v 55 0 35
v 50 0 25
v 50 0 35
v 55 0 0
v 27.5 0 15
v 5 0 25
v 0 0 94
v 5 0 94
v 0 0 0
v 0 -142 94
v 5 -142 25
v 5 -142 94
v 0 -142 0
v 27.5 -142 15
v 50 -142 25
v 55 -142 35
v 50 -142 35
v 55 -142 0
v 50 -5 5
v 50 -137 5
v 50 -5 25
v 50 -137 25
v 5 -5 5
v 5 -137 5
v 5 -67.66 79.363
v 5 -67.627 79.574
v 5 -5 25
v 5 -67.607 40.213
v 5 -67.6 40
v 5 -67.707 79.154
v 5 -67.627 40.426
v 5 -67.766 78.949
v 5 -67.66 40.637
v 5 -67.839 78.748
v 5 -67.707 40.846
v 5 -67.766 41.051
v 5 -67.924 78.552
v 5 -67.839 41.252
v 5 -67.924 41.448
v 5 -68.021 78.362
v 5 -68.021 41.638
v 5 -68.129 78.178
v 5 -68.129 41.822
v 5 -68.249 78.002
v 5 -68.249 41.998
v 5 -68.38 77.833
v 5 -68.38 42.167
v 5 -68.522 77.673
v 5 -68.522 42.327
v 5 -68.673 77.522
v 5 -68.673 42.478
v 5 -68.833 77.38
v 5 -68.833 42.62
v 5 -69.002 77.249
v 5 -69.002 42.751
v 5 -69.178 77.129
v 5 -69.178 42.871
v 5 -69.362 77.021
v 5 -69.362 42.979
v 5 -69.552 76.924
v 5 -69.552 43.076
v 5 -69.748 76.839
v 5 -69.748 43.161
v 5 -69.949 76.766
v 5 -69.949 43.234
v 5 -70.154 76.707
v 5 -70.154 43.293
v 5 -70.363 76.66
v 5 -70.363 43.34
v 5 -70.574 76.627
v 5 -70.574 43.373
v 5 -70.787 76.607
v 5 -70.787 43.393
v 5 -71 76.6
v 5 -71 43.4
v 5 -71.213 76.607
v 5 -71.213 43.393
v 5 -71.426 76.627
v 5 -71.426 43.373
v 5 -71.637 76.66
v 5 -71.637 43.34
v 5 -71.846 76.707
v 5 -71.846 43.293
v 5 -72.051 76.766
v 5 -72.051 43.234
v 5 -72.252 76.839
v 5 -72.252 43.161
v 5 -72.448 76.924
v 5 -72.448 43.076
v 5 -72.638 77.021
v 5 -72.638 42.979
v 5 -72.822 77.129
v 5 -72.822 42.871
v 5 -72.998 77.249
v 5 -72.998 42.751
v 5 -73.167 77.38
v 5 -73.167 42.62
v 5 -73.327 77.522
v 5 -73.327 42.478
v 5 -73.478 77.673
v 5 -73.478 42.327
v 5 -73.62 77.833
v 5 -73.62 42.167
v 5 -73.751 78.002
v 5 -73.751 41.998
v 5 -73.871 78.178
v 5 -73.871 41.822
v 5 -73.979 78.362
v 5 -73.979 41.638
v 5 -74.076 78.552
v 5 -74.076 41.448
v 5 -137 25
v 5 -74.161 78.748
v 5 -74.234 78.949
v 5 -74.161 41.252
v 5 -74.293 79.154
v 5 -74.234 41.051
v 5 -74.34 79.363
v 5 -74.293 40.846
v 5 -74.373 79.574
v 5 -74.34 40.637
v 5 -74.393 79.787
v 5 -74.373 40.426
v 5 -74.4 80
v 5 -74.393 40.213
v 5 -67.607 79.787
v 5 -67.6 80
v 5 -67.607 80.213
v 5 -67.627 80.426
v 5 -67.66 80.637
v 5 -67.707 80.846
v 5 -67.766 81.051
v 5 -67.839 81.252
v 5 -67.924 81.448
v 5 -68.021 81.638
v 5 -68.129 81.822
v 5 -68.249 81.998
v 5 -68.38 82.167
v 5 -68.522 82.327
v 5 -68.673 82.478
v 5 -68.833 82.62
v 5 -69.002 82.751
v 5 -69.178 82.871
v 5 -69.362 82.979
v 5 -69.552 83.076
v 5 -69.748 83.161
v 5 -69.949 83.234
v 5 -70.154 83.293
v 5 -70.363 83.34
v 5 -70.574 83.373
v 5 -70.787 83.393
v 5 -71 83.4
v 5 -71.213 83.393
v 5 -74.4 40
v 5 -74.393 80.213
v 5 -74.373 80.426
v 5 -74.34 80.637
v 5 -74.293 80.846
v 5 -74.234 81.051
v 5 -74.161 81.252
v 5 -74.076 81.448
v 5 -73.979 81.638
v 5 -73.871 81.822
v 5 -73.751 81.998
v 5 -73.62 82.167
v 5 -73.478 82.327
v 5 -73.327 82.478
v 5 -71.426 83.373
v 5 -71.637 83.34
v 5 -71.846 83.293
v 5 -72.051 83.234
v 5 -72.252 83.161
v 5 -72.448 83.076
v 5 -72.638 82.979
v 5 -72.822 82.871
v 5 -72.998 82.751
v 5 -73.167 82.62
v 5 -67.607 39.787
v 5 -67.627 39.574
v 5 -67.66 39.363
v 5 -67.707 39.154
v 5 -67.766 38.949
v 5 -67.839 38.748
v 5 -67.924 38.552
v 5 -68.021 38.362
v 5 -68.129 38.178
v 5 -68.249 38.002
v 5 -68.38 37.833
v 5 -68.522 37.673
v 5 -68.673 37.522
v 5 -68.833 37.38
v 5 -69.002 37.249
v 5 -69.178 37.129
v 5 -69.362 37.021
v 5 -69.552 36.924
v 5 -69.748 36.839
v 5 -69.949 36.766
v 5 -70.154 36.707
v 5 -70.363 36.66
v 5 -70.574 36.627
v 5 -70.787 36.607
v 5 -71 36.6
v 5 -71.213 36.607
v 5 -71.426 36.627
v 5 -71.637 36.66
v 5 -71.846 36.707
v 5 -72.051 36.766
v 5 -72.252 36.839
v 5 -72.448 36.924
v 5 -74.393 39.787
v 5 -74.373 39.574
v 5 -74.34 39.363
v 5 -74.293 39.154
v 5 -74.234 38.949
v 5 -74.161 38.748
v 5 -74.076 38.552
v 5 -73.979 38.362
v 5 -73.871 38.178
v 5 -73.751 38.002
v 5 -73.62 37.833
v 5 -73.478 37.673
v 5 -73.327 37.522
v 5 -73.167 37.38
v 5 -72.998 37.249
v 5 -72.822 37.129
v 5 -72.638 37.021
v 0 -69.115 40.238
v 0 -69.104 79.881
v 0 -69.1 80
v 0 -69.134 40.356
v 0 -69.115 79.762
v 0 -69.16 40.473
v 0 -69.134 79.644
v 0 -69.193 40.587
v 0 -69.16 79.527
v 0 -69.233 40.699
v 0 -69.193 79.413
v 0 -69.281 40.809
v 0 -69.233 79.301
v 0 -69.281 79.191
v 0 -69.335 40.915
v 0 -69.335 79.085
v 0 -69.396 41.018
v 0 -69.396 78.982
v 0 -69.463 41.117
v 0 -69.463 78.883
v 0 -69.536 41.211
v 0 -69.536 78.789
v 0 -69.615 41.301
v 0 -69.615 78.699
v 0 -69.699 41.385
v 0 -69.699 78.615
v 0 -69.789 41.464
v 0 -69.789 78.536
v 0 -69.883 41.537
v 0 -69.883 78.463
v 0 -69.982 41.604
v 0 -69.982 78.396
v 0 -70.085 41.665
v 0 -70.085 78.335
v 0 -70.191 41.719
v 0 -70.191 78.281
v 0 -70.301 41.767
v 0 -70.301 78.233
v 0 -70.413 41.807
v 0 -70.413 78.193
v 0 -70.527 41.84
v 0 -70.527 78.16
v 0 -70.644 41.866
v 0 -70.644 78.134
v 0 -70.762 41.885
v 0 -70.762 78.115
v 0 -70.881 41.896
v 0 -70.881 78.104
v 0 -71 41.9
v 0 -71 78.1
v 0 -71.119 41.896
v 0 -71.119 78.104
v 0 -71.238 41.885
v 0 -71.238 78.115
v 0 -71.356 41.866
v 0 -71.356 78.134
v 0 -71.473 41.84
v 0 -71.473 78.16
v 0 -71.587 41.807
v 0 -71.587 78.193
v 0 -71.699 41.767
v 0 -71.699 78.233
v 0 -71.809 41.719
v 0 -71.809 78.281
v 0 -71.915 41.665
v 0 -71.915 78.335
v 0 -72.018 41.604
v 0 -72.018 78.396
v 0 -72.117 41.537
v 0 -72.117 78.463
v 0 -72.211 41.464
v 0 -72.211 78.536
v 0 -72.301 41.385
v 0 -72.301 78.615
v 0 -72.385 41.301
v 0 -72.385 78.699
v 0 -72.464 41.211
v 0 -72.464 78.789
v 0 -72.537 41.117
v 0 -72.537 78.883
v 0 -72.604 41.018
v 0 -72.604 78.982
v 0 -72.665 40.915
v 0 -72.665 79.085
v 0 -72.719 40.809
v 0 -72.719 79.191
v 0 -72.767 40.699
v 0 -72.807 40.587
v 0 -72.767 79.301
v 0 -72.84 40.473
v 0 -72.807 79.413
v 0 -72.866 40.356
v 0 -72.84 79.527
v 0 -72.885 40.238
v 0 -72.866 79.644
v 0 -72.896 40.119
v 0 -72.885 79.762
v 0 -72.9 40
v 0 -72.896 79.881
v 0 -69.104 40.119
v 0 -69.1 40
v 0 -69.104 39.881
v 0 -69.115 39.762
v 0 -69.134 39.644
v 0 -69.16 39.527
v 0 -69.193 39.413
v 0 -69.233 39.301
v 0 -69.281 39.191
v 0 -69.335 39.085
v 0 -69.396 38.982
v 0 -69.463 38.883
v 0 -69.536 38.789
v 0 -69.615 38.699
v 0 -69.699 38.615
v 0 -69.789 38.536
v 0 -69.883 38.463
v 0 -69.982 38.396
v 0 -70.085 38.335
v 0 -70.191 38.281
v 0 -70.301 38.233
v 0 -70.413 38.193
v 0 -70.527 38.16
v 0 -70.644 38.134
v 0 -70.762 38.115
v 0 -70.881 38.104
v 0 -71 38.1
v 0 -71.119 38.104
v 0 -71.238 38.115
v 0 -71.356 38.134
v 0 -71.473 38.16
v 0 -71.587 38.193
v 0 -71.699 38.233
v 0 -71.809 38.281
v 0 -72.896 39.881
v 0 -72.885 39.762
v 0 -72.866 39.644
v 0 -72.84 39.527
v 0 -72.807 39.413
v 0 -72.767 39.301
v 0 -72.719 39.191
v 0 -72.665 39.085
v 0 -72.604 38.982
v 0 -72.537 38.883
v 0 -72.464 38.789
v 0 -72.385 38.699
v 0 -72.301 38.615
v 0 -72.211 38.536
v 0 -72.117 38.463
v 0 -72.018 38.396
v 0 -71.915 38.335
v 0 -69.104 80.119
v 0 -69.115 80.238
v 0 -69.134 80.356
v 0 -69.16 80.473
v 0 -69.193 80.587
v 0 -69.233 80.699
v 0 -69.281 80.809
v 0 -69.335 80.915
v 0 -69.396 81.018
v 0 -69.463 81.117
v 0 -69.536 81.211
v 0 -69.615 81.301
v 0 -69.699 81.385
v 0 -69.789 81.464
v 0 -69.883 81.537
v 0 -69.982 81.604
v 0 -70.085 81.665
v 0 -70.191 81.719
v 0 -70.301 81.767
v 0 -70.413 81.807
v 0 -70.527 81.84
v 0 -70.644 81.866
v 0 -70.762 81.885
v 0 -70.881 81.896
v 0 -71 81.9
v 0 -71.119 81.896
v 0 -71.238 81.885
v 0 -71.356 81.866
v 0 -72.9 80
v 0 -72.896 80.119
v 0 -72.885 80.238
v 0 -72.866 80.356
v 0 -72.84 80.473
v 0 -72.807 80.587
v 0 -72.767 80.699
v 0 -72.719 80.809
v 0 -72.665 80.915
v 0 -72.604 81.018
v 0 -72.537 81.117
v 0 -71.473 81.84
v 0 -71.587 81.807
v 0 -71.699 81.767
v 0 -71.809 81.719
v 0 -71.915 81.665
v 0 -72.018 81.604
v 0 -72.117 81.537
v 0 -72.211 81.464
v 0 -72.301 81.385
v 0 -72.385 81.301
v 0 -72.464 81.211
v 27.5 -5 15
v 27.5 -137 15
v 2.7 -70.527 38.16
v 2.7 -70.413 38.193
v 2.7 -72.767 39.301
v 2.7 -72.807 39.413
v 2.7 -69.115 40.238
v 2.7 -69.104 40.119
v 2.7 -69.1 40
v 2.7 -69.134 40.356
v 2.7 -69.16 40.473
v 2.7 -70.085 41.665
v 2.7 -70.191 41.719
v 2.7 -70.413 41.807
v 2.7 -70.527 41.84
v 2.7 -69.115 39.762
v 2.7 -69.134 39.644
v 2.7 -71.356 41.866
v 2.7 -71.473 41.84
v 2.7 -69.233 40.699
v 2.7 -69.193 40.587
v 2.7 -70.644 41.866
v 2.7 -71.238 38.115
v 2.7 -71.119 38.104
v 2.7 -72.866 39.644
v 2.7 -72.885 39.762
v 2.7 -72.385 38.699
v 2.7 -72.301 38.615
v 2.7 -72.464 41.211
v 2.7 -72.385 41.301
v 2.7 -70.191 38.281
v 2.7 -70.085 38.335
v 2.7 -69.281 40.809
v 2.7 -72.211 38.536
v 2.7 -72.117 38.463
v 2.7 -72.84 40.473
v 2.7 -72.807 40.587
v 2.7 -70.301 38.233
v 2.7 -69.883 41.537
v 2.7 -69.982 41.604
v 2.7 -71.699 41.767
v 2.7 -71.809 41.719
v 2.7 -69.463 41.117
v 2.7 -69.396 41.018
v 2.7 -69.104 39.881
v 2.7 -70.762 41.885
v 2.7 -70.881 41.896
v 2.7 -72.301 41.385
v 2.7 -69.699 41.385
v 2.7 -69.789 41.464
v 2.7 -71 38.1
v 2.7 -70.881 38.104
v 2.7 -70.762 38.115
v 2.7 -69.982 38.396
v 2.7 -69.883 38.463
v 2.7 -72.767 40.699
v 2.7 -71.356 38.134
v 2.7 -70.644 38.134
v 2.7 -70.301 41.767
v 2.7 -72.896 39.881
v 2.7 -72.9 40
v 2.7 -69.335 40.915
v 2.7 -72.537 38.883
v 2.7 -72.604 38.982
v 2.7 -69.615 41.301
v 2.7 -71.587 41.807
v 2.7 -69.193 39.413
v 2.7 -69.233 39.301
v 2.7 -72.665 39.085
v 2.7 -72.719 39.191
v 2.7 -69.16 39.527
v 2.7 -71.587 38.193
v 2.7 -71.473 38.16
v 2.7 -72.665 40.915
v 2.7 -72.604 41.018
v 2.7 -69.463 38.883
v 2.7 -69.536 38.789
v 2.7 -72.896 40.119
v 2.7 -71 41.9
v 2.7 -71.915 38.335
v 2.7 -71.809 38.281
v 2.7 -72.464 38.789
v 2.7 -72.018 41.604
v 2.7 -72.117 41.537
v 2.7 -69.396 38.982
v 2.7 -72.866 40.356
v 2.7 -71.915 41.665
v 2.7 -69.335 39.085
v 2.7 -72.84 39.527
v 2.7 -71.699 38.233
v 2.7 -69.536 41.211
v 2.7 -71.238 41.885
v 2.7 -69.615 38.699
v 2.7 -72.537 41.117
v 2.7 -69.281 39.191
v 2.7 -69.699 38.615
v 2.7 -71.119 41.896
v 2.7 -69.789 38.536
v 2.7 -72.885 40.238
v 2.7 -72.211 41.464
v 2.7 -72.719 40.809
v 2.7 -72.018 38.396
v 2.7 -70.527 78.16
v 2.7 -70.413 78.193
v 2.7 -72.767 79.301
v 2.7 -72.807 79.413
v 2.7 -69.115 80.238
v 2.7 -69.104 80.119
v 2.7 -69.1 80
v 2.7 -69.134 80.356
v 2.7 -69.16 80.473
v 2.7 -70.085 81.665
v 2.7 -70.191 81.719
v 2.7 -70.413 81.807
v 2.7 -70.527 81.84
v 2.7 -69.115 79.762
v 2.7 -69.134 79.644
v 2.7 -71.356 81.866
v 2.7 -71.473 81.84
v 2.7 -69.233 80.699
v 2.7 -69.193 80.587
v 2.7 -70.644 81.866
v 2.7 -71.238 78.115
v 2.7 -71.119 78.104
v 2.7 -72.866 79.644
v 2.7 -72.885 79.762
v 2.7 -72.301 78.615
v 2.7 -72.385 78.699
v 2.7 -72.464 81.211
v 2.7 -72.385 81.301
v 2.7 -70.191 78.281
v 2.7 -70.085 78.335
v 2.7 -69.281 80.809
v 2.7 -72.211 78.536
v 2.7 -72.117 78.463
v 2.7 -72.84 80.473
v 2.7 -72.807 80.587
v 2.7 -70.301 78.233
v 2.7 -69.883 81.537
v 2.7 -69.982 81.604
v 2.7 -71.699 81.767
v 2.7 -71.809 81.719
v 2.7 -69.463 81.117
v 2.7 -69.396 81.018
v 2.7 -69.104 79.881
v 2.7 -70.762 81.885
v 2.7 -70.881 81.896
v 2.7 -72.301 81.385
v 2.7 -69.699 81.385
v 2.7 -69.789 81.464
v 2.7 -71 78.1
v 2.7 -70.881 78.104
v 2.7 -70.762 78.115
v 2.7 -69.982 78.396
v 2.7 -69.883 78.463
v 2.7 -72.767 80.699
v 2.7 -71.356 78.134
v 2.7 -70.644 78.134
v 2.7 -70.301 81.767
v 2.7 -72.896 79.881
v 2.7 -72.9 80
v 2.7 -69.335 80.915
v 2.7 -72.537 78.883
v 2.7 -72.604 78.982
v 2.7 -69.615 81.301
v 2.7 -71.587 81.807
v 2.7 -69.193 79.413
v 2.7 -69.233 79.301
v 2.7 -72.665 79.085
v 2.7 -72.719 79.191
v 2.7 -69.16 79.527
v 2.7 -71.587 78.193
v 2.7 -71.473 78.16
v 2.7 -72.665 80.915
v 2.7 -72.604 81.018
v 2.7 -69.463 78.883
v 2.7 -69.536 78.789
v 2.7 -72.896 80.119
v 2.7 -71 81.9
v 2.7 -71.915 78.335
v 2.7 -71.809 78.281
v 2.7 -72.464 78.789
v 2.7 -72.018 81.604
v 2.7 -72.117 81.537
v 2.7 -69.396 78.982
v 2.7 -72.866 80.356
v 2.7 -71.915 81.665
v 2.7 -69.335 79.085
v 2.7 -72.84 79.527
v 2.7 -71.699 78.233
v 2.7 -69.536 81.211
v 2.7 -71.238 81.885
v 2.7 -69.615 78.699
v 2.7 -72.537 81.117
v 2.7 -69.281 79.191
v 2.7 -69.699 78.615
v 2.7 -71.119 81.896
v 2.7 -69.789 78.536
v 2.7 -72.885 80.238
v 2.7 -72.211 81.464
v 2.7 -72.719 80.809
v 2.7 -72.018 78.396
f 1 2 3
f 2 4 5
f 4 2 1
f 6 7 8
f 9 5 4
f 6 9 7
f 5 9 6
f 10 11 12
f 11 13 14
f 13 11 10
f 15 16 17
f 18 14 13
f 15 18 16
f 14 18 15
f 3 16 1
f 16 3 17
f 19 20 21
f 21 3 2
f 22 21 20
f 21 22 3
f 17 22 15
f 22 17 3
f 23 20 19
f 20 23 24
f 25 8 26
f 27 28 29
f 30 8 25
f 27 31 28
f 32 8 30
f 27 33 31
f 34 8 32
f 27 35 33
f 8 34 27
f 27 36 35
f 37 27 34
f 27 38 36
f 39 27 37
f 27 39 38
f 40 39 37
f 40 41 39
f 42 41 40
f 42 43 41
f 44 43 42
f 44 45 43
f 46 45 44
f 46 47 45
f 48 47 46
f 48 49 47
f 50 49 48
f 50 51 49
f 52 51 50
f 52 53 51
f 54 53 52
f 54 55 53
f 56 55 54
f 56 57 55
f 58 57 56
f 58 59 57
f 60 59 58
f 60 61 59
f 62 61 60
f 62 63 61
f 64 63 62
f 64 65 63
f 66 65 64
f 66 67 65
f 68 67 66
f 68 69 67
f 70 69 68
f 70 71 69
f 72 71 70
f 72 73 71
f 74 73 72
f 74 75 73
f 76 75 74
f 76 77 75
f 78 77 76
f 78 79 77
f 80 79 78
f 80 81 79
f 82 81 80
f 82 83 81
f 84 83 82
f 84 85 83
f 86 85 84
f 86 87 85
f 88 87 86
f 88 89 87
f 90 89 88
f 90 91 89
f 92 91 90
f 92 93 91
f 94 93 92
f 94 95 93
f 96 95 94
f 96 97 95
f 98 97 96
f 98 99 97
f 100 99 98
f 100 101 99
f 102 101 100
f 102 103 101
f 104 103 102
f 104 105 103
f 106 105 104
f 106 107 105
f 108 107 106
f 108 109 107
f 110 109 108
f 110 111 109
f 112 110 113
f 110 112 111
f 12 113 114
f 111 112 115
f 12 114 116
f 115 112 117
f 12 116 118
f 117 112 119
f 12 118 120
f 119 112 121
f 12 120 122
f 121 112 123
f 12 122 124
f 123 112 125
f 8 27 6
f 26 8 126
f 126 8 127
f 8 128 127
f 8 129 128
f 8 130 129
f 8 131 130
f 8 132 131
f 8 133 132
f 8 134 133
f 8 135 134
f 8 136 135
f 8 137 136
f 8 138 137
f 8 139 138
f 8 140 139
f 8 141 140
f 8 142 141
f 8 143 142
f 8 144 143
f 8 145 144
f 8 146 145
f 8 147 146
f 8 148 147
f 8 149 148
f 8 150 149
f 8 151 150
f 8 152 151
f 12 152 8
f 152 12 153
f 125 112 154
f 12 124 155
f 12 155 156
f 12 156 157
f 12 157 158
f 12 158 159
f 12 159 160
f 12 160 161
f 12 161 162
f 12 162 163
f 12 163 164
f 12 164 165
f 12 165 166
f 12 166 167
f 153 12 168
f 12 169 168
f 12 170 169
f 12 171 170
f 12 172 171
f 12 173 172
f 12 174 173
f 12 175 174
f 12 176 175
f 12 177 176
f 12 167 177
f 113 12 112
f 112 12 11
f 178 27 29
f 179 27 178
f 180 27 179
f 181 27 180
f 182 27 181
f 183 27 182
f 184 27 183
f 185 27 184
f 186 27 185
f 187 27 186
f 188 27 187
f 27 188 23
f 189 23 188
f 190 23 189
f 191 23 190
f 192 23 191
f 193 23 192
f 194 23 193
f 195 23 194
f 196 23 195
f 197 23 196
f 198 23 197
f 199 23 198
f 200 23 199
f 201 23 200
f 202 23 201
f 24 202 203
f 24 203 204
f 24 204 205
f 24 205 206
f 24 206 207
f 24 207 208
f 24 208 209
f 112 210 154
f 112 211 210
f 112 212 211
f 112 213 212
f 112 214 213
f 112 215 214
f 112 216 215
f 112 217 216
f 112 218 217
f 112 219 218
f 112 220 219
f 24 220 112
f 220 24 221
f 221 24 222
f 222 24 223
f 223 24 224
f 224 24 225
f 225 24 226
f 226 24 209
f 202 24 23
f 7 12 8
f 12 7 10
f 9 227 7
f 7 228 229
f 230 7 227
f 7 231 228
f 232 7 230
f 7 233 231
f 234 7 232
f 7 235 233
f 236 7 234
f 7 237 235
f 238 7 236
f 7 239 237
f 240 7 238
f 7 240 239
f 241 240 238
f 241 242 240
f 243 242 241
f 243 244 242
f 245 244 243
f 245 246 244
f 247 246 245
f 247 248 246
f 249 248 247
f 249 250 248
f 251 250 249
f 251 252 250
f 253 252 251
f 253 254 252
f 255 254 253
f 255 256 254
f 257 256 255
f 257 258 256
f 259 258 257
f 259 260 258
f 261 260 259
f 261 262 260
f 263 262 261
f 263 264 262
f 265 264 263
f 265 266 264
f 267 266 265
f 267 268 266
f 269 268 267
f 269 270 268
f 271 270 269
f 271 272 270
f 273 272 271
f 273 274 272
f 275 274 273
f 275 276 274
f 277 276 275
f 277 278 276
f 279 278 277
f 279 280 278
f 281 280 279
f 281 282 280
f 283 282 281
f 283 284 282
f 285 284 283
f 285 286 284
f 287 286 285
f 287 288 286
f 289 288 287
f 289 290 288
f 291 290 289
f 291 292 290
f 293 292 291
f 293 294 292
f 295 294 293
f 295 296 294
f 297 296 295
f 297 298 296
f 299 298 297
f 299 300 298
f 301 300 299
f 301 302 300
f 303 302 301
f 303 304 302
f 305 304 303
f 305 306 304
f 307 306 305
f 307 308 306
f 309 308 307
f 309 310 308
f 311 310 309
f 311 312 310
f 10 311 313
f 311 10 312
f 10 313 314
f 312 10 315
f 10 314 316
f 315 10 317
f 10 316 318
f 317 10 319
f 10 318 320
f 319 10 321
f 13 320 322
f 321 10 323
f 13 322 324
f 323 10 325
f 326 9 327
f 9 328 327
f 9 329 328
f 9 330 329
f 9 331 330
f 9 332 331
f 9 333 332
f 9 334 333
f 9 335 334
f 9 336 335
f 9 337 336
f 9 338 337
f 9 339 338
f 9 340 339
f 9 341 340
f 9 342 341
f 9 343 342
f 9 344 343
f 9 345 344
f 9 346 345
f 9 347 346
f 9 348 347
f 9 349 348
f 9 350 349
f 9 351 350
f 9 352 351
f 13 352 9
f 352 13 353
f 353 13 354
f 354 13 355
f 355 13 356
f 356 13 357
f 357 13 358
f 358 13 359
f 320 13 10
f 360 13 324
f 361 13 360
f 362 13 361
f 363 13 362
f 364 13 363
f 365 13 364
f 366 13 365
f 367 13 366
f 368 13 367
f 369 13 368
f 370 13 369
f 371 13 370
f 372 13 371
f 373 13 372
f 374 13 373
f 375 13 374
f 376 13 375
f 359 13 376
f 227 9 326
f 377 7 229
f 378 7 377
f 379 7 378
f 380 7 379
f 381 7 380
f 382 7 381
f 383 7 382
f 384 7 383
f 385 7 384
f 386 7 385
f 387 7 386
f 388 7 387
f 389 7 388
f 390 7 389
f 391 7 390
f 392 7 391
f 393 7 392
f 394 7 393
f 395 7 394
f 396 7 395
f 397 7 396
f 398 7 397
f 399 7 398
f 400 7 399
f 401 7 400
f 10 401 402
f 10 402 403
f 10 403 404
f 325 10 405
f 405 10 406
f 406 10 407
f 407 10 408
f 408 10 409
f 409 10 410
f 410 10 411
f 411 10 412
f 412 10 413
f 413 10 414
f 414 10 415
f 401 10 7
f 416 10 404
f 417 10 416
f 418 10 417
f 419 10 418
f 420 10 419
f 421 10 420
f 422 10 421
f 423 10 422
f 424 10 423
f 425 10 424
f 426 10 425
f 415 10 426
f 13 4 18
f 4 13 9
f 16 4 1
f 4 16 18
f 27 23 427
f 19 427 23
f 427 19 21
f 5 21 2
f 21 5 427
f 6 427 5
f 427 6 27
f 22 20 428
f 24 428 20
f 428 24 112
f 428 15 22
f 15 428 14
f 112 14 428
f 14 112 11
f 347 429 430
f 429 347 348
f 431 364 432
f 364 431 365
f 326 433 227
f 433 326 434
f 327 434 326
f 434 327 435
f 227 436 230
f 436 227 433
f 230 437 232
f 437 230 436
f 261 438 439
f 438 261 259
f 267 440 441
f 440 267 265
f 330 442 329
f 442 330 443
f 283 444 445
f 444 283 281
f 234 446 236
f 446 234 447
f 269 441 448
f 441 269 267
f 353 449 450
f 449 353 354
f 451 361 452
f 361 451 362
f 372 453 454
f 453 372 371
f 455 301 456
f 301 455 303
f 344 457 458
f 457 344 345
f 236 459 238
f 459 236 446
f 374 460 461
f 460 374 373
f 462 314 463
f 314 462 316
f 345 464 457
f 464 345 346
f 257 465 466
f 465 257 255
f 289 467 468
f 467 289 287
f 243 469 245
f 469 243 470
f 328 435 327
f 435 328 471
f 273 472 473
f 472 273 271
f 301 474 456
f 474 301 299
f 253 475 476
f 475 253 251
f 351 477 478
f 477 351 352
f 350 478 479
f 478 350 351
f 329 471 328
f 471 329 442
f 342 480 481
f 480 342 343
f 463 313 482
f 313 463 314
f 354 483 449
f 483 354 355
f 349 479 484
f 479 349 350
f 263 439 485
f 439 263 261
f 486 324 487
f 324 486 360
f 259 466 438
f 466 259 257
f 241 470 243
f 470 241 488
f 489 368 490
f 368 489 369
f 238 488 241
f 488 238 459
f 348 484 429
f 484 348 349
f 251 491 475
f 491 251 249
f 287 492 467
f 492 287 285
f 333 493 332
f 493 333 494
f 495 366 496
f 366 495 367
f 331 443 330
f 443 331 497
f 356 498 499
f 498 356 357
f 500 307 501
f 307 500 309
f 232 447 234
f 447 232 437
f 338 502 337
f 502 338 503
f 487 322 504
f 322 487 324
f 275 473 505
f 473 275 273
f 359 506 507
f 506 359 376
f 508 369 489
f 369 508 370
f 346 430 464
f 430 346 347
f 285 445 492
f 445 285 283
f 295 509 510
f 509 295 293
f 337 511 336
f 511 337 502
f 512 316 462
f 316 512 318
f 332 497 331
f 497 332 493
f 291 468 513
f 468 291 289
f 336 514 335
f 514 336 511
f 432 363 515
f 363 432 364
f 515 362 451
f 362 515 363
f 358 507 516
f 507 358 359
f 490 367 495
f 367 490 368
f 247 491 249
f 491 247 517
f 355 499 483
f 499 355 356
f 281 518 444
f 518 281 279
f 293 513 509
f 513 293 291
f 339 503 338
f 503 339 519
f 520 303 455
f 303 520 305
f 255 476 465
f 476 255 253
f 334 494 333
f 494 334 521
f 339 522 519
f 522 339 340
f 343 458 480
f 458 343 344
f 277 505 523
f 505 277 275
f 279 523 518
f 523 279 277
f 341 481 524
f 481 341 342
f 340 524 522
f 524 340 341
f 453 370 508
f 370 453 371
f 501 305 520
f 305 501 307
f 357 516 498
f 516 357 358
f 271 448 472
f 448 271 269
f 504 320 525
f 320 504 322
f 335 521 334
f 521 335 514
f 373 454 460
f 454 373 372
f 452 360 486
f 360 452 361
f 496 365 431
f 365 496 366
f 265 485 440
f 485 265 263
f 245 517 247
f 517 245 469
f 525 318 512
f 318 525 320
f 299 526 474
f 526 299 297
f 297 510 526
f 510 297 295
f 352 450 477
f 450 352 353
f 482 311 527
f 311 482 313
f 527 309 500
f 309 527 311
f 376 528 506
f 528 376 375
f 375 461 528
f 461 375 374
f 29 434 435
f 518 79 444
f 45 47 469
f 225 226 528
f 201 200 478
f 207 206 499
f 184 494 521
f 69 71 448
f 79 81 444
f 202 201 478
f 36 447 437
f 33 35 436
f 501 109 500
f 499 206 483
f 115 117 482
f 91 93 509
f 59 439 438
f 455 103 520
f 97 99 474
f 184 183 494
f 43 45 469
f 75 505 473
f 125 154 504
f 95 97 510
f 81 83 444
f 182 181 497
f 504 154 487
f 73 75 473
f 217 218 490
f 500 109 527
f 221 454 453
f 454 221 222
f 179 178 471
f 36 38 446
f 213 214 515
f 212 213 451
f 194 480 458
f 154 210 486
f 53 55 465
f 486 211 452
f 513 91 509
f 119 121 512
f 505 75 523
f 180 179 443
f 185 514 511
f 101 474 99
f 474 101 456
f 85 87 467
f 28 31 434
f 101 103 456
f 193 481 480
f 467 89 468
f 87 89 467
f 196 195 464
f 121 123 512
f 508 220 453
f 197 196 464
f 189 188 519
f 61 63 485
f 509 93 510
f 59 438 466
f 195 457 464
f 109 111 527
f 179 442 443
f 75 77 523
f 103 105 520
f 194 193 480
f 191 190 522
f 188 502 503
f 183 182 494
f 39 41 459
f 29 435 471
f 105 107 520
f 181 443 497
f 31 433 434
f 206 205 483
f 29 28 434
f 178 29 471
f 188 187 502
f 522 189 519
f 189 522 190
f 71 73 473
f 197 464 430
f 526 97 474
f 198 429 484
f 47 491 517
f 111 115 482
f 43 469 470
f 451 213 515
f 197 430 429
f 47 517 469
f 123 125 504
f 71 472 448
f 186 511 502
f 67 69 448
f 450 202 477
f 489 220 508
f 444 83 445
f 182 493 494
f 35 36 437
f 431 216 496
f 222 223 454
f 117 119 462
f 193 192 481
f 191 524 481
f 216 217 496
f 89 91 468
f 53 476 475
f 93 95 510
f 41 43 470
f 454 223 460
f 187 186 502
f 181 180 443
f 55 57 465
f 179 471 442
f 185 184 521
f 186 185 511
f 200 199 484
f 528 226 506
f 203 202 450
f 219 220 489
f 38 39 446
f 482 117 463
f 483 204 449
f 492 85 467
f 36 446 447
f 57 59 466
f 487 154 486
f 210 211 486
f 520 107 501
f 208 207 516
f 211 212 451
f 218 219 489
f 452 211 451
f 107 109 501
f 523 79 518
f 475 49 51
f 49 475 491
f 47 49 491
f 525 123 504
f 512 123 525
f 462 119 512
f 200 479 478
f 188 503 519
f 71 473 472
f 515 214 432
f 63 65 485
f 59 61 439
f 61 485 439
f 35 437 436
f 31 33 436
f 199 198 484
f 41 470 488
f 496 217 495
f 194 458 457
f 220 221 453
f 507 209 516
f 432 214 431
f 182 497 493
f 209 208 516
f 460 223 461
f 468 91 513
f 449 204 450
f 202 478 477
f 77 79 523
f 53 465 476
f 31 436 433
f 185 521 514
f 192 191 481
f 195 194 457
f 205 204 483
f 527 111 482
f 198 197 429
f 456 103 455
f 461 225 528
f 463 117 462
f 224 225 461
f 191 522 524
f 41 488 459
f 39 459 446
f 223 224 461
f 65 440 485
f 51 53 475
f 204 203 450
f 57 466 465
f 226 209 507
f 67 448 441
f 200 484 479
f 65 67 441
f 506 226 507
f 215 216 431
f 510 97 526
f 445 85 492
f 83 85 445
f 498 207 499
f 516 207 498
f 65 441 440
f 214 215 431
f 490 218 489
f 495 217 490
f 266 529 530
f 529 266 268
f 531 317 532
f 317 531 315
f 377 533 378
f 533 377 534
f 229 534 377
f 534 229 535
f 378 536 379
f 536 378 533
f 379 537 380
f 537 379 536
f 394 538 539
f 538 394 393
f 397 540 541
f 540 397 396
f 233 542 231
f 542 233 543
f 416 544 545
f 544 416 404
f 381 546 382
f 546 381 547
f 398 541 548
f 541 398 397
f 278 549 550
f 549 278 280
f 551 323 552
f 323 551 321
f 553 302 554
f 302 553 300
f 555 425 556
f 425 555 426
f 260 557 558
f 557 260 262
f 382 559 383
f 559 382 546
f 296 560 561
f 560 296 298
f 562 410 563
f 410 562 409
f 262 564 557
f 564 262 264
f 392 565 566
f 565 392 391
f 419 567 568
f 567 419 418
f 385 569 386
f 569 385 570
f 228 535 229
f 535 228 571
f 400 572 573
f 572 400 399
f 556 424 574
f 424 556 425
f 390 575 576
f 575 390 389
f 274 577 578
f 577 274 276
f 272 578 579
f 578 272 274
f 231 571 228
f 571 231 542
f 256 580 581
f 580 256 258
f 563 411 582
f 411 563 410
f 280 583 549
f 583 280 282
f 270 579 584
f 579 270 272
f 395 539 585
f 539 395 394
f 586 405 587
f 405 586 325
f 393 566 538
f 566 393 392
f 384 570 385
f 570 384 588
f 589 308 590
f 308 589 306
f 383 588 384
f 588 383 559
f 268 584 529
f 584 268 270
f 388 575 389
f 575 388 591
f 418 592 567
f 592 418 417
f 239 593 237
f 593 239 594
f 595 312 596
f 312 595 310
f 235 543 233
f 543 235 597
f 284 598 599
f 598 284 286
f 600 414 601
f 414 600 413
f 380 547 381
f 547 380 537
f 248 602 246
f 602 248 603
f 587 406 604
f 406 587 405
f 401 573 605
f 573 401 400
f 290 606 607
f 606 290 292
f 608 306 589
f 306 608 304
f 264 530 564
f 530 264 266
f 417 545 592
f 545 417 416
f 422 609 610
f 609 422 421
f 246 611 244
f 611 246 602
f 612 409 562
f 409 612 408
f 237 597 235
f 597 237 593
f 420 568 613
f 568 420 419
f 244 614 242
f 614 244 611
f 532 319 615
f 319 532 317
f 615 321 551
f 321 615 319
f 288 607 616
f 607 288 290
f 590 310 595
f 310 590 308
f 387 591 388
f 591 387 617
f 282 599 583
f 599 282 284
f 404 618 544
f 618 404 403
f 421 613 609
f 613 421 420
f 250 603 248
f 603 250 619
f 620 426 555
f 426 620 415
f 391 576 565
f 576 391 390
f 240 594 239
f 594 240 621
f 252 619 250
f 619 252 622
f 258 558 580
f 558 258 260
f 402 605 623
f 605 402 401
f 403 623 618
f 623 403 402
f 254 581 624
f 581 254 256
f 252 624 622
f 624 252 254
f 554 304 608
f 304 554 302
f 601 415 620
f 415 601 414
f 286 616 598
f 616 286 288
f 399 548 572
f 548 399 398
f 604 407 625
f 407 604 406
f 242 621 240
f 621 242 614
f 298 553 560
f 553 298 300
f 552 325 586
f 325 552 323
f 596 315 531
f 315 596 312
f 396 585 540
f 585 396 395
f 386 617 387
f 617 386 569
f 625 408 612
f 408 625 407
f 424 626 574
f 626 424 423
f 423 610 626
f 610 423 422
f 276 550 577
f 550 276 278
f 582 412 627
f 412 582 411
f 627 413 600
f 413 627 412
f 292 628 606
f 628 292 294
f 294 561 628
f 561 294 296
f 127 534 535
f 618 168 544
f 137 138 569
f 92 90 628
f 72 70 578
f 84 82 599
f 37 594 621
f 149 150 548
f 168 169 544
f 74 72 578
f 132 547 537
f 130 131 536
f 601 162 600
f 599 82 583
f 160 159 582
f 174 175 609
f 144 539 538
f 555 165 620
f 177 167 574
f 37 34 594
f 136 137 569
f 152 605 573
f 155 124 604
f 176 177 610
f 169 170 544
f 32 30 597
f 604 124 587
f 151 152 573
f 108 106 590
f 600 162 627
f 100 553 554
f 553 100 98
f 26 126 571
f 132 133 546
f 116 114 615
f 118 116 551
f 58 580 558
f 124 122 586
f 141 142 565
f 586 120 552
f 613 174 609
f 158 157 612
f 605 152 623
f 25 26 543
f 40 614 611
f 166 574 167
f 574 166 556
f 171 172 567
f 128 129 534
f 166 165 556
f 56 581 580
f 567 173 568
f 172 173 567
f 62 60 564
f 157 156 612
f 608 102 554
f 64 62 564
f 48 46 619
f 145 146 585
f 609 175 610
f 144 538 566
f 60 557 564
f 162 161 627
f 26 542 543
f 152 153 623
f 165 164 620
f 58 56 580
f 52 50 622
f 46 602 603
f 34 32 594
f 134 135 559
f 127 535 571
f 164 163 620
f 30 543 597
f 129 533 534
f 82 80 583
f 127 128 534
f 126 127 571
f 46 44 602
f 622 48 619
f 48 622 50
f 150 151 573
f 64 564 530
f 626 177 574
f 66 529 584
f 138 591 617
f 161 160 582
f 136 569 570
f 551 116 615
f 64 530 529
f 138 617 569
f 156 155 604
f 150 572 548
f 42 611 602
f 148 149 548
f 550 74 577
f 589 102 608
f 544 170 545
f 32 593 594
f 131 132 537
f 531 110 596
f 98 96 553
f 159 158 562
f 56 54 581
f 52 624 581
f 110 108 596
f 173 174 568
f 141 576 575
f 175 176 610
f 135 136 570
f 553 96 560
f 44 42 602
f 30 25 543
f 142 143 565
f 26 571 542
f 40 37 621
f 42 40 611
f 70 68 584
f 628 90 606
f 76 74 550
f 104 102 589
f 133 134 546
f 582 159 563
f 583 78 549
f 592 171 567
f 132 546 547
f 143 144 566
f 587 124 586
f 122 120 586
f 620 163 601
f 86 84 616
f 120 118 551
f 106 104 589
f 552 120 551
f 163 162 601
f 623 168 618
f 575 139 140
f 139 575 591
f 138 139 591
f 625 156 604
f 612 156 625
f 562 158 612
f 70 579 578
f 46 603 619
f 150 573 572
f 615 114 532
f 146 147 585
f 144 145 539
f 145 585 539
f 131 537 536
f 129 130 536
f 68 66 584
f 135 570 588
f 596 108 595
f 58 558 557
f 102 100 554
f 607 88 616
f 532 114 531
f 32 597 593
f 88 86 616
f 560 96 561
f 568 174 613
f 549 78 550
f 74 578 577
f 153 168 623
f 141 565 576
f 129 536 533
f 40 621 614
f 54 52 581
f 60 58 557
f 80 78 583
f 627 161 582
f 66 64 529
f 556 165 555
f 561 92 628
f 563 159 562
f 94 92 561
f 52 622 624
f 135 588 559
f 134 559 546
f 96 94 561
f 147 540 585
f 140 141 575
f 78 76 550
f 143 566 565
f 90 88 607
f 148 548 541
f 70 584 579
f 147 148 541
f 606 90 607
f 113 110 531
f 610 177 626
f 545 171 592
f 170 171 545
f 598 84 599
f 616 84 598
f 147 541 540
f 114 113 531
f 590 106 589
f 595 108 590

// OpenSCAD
/********************************************/
/*    Surfboard Modem Wall-Mounted Shelf    */
/*                                          */
/*        Created by Jason Hardman          */
/*               2022-05-22                 */
/*                                          */
/********************************************/


/* Variables */
$fn = 100;

/* surfboard dementions */
the_height = 134;  // A/Y
the_width = 132;   // C/Z
the_depth = 45;    // B/X

/* shelf args */
thickness = 5;
back_height_offset = 45;
front_height_offset = 35;


/* Module definitions */
module the_surf(the_x=0, the_y=0, the_z=0){
  translate([the_x, the_y, the_z]){
    rotate([0,0,0]){
      cube([the_depth, the_height, the_width]);  // The bottom of the router is sitting on the x/z plane while the wall is the y/z plane
    }
  }
}


module support(the_x=0, the_y=0, the_z=0){
  translate([the_x, the_y, the_z]){
    rotate([0,0,0]){
      linear_extrude(thickness){
        polygon([
          [thickness, 20 + thickness],
          [the_depth/2 + thickness, 10 + thickness],
          [the_depth + thickness, 20 + thickness],
          [the_depth + thickness,thickness],
          [thickness,thickness],
        ]);
      }
    }
  }
}


module screw_hole(the_x=0, the_y=0, the_z=0){
  rad_1 = 1.9;
  rad_2 = 3.4;
	length = thickness;
  screw_head_width = 2.3;
  shaft_hole = length - screw_head_width;
  translate([the_x, the_y, the_z]){
    rotate([0,90,0]){
      union() {
        cylinder(h = shaft_hole, r = rad_1);
        translate([0,0,shaft_hole]) cylinder(h = screw_head_width, r1 = rad_1, r2 = rad_2);
      }
    }
  }
}


module the_shelf(){
  linear_extrude(the_width + (thickness*2)){
    polygon([
      [0,the_height + thickness - back_height_offset],
      [0,0],
      [the_depth + (thickness*2),0],
      [the_depth + (thickness*2),front_height_offset],
      [the_depth + thickness,front_height_offset],
      [the_depth + thickness,thickness],
      [thickness,thickness],
      [thickness,the_height + thickness - back_height_offset]
    ]);
  }
}


/* Module calls */
*color("white", 0.9){the_surf(thickness, thickness, thickness);}
rotate([90, 0, 0]) {
  difference(){
    union(){
      color("blue"){
        the_shelf();
        support();
        support(the_z=(the_width + thickness));
      }
    }
    screw_hole(the_y = 40,
              the_z = the_width/2 + thickness);
    screw_hole(the_y = 80,
              the_z = the_width/2 + thickness);
  }
}

*screw_hole();
